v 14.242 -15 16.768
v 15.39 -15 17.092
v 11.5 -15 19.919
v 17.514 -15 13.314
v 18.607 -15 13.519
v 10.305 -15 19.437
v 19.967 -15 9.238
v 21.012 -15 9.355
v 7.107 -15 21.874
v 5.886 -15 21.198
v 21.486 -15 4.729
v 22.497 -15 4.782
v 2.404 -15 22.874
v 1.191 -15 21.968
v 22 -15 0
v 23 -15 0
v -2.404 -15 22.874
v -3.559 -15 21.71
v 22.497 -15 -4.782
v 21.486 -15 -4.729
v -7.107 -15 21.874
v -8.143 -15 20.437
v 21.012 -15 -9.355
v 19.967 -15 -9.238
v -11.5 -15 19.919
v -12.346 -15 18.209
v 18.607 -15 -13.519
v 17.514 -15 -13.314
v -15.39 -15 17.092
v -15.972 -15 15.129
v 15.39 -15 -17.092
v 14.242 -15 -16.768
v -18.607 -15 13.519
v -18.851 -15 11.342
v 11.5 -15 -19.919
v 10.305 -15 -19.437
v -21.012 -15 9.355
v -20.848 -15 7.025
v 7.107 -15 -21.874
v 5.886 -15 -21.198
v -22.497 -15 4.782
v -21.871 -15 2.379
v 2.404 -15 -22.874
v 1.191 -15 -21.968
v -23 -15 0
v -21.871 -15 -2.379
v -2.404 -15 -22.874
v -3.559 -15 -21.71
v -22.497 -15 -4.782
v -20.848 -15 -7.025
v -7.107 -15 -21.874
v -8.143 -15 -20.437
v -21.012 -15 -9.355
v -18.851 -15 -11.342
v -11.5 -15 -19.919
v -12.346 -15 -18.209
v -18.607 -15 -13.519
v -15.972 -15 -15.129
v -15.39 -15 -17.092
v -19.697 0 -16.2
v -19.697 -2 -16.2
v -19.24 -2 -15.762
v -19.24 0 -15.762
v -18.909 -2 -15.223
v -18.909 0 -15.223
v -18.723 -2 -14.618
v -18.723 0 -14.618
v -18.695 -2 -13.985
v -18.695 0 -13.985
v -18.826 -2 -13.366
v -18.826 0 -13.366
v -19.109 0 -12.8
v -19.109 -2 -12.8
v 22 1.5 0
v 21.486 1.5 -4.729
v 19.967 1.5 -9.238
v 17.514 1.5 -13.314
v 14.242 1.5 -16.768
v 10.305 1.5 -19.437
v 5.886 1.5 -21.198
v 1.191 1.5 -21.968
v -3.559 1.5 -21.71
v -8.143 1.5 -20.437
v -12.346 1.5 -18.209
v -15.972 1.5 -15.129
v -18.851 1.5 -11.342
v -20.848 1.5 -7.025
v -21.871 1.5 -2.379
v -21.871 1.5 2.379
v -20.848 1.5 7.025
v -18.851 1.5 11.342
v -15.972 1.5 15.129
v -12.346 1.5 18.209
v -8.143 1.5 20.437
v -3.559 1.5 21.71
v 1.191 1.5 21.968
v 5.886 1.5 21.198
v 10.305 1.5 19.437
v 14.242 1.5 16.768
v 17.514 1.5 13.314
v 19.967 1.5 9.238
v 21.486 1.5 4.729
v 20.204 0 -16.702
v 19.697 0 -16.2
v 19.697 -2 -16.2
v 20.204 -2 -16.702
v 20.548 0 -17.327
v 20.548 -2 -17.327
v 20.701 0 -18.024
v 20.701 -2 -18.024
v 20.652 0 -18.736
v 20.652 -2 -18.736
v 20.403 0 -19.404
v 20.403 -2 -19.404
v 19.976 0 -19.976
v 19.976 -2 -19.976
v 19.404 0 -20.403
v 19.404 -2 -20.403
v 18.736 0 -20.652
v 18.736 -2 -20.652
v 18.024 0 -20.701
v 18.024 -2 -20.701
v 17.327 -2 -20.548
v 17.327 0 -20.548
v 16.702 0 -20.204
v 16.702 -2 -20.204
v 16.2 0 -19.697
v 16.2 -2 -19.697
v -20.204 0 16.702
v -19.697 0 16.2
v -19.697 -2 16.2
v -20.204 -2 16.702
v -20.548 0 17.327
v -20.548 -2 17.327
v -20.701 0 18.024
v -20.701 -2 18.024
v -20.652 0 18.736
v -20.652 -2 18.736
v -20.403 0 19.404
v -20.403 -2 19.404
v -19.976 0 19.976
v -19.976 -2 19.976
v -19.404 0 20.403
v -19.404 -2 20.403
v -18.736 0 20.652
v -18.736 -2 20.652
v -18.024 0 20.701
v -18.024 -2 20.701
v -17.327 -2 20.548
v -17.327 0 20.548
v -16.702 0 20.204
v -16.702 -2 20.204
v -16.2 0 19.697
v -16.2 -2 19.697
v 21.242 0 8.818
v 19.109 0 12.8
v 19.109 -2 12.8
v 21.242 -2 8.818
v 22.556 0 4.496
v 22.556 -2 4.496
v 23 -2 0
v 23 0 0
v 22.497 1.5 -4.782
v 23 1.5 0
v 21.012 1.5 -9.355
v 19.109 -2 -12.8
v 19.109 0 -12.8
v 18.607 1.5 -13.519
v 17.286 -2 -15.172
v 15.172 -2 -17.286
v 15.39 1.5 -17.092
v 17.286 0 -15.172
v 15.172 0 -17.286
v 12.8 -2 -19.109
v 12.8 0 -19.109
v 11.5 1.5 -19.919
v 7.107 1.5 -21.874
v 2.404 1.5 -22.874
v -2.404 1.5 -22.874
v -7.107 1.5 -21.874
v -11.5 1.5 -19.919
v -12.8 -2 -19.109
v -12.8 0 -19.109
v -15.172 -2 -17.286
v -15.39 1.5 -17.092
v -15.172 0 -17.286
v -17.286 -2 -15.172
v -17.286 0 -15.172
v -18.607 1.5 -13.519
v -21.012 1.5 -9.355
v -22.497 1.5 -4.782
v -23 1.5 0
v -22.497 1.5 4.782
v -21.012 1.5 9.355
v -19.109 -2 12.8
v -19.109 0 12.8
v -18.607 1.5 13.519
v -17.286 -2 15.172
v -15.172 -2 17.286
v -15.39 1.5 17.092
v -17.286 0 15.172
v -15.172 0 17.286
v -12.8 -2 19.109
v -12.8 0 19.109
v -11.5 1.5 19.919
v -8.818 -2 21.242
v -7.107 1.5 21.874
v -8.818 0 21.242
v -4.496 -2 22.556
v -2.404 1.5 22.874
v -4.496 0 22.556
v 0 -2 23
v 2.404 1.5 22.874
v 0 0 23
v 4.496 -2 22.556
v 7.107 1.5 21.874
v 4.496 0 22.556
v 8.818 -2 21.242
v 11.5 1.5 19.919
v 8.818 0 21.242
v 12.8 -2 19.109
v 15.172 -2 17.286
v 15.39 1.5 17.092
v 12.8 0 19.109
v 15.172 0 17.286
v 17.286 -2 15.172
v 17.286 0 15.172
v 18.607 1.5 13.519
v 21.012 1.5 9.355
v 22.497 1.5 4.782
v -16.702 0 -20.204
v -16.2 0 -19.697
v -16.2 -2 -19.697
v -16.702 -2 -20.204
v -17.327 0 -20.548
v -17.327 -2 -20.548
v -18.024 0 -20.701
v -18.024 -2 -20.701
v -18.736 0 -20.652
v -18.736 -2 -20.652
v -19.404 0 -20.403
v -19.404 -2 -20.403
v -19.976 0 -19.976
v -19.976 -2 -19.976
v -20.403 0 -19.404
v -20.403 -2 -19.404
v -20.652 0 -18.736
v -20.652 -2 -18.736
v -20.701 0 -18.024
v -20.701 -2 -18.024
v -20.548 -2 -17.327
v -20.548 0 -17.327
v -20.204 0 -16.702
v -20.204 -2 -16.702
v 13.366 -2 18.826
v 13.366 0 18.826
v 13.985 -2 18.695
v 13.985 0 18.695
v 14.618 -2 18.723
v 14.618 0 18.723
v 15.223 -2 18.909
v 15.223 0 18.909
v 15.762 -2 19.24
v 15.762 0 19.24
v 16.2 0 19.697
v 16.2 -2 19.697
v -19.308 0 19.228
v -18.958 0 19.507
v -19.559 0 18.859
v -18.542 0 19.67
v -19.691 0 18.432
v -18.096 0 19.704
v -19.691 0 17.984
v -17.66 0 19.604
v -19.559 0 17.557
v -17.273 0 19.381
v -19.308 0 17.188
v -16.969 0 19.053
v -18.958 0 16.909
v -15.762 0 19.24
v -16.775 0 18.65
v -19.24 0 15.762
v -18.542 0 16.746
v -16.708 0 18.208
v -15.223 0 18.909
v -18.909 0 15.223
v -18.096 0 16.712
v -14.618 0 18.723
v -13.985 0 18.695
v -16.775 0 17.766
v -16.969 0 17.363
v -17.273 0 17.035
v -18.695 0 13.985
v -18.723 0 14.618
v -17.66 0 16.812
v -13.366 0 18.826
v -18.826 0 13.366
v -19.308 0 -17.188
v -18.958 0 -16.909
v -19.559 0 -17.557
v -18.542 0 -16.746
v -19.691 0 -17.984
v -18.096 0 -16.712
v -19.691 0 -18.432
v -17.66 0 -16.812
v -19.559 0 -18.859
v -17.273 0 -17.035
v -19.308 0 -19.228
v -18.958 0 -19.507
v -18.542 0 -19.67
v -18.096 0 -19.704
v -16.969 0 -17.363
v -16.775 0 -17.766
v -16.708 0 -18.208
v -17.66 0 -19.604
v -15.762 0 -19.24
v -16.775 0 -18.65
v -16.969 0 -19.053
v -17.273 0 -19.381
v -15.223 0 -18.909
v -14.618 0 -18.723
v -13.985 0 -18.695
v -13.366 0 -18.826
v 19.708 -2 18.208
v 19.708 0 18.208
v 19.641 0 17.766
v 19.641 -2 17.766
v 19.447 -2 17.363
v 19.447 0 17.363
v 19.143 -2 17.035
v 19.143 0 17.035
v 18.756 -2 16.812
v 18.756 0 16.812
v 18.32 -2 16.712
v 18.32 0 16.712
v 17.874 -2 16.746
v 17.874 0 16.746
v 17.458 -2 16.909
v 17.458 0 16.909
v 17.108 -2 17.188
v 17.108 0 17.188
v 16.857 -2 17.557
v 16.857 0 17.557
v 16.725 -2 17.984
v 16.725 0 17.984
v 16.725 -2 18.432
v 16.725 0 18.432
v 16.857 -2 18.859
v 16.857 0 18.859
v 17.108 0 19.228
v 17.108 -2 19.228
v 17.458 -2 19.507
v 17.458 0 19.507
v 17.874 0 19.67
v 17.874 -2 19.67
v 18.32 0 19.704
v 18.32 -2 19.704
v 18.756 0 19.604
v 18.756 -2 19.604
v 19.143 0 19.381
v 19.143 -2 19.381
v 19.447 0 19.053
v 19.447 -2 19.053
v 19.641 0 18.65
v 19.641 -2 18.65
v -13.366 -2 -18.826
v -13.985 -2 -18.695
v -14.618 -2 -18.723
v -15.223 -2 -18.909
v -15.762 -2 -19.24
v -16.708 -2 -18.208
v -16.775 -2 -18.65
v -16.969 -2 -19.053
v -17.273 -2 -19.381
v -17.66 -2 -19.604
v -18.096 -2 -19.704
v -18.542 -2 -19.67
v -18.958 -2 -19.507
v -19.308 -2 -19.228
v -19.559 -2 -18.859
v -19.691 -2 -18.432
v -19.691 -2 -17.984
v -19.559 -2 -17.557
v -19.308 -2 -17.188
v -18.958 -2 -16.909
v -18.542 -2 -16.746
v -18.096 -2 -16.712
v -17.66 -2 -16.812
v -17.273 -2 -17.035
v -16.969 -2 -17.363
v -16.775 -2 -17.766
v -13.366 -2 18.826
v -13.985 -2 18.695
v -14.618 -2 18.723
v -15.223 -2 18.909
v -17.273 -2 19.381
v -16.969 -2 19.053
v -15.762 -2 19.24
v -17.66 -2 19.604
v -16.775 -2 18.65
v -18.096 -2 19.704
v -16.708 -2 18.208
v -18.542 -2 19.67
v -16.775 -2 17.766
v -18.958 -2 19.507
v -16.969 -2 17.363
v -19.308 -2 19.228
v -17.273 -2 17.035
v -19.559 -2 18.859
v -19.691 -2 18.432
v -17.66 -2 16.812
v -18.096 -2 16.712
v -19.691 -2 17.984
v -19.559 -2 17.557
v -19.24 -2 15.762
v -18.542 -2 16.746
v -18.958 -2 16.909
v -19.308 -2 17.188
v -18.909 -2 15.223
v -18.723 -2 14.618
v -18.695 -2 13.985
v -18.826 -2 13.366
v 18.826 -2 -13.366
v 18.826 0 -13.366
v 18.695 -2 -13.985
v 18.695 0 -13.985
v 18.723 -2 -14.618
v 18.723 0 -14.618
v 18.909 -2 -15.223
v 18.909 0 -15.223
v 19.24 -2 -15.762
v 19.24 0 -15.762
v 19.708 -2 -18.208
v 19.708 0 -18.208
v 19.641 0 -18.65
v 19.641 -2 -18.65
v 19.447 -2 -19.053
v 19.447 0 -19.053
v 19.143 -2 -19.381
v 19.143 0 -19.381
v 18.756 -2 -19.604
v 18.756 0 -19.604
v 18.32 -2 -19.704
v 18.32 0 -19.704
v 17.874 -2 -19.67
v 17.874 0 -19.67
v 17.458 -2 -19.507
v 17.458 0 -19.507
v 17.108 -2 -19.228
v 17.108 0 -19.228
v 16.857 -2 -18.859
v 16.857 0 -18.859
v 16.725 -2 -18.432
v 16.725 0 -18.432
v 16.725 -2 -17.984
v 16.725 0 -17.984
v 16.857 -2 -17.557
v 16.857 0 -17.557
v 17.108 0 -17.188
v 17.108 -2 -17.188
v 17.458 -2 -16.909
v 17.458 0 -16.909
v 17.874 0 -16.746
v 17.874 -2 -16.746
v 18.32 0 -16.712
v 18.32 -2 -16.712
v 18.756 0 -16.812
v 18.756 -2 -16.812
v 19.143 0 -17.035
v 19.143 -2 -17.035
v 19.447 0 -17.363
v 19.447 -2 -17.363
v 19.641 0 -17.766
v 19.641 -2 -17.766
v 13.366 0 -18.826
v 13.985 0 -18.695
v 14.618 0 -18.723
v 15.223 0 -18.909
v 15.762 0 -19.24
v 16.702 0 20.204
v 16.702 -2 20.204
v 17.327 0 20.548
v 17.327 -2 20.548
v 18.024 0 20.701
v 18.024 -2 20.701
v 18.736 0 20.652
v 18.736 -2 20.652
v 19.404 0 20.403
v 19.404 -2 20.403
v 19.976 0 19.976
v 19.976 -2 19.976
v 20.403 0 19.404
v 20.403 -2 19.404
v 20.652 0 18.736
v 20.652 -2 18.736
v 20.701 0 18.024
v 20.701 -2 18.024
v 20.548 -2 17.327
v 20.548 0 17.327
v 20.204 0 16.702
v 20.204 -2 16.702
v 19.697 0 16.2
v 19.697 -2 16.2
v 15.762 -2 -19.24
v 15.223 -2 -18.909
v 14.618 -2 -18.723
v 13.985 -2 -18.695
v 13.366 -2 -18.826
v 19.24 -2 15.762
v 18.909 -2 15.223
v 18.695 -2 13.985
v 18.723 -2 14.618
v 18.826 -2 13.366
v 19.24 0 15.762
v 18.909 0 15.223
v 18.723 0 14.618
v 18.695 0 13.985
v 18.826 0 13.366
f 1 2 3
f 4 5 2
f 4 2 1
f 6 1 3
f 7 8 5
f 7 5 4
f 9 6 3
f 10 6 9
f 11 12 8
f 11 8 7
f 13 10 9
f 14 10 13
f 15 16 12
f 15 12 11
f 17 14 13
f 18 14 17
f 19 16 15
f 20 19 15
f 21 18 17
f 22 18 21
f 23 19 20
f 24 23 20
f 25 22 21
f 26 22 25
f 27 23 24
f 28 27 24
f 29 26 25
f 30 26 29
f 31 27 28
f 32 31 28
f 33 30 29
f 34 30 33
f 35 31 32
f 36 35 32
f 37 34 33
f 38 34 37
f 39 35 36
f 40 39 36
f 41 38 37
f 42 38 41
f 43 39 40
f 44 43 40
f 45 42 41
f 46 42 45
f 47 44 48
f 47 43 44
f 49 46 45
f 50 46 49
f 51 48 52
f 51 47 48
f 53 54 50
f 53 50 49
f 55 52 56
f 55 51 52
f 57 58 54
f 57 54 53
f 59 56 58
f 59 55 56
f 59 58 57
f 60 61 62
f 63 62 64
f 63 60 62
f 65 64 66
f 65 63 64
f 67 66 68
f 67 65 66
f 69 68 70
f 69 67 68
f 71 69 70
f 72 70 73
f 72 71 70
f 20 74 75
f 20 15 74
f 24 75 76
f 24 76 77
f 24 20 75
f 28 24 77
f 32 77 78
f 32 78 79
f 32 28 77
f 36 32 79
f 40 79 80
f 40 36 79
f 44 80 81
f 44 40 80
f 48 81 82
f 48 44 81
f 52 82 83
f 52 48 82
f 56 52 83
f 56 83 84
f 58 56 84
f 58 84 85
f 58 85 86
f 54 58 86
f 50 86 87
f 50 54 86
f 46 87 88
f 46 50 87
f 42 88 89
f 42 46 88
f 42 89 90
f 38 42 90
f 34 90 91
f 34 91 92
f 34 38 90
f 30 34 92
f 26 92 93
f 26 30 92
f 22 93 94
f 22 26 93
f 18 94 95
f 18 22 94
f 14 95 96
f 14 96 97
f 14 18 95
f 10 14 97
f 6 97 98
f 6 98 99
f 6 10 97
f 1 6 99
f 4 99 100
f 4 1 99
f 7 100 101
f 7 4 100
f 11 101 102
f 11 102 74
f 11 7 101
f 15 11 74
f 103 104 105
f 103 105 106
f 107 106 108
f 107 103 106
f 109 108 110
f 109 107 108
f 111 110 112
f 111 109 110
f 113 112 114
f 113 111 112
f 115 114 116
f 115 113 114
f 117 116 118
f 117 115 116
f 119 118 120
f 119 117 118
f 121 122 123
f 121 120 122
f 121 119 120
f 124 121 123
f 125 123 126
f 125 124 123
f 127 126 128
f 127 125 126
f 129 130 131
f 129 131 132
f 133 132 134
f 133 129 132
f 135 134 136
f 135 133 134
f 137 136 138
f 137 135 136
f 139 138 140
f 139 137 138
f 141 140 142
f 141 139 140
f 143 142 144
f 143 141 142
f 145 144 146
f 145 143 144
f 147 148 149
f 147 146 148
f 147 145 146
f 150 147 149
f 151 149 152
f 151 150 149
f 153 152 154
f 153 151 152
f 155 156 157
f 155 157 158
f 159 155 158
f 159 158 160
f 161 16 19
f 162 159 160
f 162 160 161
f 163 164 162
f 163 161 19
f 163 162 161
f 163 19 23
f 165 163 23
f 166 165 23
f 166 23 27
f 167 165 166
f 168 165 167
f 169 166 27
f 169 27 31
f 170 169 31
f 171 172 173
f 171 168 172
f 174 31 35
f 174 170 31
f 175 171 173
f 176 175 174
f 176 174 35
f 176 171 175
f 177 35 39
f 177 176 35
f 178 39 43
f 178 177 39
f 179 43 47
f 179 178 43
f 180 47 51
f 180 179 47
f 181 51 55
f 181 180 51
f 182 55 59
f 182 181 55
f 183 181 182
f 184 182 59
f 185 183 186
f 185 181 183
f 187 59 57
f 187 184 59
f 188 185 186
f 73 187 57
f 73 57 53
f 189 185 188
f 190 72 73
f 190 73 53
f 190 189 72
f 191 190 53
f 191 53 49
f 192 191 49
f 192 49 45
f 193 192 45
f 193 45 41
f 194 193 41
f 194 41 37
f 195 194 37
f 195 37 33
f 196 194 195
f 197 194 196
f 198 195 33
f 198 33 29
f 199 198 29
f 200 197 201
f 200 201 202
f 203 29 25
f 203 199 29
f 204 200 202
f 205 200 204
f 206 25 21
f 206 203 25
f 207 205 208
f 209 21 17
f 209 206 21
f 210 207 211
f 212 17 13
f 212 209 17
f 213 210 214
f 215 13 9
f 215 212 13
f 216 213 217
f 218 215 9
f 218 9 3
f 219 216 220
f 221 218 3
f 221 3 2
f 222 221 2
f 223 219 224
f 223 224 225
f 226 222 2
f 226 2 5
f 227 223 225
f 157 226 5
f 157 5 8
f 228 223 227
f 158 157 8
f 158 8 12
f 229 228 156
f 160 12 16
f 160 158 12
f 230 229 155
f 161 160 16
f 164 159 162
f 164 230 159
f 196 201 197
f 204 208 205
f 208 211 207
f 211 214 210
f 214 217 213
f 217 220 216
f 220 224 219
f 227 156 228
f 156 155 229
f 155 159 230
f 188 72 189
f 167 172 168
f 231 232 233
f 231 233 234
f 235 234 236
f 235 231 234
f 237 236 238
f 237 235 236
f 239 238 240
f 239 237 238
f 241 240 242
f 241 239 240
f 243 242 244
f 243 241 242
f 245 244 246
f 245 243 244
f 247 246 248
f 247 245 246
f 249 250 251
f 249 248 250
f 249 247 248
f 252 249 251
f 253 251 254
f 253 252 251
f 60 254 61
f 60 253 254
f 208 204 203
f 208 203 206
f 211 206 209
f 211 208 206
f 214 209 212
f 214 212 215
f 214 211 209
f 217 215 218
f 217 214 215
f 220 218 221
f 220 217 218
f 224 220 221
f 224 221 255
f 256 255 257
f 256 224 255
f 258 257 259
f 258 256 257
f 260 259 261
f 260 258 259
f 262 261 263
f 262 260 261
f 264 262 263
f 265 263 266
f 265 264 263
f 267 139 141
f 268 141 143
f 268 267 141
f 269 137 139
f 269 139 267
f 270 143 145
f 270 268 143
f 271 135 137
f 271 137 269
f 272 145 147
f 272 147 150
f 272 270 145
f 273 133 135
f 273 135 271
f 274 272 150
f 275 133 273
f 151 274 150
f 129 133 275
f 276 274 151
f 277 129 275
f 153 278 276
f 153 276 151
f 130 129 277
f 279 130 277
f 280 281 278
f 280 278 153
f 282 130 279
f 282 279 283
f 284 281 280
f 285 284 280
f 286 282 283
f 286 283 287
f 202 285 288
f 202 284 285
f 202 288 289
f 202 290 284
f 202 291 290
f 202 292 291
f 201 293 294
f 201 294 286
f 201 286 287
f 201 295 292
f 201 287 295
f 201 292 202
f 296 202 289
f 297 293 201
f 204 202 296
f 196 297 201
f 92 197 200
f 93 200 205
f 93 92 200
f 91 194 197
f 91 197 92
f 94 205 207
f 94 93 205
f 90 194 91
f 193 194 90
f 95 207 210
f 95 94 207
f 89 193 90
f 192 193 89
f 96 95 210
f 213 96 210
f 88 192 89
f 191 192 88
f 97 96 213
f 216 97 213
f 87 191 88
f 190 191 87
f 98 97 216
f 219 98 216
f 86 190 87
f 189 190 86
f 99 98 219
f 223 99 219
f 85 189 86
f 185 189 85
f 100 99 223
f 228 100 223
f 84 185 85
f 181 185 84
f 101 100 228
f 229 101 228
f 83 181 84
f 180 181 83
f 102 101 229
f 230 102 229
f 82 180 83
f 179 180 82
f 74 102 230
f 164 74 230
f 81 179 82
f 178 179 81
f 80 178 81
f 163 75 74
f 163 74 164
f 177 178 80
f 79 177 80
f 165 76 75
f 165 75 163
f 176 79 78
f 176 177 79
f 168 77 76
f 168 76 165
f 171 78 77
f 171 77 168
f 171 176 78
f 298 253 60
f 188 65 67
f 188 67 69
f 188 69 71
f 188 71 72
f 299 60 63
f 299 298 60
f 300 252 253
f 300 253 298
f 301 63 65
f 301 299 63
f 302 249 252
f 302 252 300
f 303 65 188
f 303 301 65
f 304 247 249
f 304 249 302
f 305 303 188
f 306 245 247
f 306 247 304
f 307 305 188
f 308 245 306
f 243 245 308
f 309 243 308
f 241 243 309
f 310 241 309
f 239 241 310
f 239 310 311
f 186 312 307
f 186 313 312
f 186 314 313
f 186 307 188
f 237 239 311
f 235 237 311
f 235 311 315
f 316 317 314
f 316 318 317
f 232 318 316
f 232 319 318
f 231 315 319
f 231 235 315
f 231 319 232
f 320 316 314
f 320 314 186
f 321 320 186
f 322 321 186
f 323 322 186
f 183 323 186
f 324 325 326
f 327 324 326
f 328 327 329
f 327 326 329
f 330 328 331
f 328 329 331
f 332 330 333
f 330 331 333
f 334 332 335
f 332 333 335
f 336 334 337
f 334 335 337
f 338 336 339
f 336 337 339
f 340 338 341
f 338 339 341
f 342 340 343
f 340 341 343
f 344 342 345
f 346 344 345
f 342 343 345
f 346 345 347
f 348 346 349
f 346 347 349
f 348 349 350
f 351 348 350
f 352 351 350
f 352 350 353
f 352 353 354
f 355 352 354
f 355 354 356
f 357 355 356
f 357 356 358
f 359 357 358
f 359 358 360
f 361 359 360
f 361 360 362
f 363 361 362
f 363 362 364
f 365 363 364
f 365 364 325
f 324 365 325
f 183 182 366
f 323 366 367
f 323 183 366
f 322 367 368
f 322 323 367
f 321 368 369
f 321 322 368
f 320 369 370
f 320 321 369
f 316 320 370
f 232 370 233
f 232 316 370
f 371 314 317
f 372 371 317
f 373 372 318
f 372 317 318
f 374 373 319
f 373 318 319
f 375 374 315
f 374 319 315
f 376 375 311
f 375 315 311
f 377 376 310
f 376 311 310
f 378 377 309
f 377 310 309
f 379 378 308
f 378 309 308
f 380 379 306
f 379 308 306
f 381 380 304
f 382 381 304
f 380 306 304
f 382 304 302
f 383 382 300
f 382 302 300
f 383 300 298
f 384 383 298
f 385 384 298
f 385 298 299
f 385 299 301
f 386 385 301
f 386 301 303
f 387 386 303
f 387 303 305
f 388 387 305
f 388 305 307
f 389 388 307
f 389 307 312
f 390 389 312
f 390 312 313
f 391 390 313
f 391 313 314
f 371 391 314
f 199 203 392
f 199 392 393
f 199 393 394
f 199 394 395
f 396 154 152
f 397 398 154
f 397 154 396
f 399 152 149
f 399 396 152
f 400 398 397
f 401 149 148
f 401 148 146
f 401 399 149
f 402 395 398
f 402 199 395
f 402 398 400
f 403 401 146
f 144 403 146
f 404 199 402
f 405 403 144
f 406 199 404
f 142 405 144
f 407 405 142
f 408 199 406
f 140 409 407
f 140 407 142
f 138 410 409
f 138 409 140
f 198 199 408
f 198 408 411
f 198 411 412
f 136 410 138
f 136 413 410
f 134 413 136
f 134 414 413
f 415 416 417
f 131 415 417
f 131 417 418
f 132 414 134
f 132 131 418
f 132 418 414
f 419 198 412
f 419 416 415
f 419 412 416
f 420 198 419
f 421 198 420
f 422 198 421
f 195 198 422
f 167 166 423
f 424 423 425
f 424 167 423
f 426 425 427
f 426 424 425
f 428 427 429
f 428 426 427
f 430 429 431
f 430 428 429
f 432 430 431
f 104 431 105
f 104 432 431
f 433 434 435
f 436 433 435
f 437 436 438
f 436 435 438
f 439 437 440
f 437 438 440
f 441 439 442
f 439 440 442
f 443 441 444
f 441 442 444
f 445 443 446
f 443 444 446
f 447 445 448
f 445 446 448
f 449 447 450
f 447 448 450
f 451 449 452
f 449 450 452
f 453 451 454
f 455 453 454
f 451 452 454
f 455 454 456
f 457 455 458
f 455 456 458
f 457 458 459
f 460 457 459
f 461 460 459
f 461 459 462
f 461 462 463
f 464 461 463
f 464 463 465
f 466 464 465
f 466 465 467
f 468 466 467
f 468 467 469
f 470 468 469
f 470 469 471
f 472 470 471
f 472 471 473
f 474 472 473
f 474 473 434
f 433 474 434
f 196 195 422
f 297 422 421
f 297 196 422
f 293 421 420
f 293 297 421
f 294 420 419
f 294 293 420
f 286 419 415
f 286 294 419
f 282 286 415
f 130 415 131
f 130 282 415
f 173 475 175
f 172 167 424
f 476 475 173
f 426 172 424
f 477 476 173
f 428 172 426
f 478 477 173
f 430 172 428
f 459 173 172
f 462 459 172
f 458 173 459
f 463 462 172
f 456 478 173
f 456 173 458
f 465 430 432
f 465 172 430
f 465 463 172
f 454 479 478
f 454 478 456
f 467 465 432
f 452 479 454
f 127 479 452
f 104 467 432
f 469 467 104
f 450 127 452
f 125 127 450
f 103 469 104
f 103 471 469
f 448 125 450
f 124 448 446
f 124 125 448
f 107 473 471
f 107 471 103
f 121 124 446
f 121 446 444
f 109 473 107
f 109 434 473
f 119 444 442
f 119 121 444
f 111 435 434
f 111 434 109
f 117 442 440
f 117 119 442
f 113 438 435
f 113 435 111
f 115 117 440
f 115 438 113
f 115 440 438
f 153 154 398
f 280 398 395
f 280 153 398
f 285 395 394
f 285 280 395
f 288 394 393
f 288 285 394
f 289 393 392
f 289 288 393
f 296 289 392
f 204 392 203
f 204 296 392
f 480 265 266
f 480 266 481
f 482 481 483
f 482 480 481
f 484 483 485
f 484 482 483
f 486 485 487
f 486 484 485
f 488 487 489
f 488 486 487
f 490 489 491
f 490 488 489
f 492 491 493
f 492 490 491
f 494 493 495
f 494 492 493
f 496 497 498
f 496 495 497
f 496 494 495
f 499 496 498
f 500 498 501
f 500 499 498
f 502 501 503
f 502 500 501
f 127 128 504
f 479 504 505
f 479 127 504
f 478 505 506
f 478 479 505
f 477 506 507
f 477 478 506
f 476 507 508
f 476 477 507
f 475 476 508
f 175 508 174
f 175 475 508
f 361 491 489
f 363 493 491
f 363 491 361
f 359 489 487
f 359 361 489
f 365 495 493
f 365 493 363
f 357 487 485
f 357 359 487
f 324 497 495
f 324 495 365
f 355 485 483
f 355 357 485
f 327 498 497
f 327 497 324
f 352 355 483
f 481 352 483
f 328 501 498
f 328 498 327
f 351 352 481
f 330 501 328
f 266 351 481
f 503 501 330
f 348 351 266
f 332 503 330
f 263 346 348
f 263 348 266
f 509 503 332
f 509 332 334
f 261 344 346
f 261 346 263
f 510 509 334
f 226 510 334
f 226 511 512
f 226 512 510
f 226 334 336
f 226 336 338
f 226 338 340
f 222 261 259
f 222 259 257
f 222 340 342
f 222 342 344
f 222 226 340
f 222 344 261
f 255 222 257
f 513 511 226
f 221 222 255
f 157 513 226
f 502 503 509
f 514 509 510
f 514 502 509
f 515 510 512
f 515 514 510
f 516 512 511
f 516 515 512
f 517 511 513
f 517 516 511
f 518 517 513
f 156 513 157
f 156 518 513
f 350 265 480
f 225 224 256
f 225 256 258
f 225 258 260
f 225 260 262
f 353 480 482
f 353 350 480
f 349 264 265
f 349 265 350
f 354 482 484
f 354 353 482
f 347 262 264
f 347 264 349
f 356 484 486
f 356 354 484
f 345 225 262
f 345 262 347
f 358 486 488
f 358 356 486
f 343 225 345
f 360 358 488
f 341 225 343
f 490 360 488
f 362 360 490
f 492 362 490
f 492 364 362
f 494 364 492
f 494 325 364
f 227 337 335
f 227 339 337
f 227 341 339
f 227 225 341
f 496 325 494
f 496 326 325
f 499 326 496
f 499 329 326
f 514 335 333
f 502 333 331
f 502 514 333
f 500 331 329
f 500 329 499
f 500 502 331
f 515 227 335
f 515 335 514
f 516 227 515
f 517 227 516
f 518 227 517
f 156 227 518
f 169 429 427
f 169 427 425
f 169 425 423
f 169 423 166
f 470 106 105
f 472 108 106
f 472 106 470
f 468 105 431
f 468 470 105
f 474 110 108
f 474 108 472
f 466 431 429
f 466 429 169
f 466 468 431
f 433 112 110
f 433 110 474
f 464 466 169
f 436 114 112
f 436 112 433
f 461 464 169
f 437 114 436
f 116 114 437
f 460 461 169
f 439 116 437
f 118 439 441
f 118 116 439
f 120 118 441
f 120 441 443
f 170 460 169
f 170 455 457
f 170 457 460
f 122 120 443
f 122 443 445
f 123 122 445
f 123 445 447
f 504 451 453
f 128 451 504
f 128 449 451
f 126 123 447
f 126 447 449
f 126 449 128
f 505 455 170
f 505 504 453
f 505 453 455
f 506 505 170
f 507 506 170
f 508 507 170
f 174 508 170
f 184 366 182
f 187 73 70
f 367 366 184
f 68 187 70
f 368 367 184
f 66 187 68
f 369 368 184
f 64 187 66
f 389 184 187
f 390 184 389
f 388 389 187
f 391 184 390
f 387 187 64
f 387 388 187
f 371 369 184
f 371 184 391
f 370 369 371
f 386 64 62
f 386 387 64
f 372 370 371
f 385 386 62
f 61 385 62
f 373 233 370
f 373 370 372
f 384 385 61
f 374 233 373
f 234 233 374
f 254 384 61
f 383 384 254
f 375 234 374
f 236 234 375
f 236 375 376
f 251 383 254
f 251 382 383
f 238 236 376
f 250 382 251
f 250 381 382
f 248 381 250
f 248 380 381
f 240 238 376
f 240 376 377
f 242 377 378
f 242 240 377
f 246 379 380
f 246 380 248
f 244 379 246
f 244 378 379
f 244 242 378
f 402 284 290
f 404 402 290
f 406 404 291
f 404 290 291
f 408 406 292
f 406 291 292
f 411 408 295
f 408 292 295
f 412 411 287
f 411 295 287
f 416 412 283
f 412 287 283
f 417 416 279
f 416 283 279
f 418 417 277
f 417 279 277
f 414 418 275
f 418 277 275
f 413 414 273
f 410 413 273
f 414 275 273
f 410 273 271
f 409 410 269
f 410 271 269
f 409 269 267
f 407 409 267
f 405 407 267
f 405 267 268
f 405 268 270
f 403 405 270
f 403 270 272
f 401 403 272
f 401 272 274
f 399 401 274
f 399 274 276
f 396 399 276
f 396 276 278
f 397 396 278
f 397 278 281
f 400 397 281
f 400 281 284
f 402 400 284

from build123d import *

# Parameters (mm, degrees)
SKETCH_2_R          = 1.5
CUT_EXTRUDE_1_DEPTH = 16
SKETCH_4_OUTSIDE_W  = 74.818
SKETCH_4_OUTSIDE_H  = 74.818
CUT_EXTRUDE_3_DEPTH = 16


with BuildPart() as part:
    # 草图1 → 旋转1 (revolve)
    with BuildSketch(Plane.XY):
        Polygon((22, 1.5), (22, -15), (23, -15), (23, -2), (28.25, -2), (28.25, 0), (23, 0), (23, 1.5), align=None)
    revolve(axis=Axis((0, 0, 0), (0, 1, 0)))

    # 草图2 → 切除-拉伸1 (cut, through all)
    with BuildSketch(Plane(origin=(0, 0, 0), x_dir=(1, 0, 0), z_dir=(0, 1, 0))):
        with Locations((-18.207999616, 18.207999616)):
            Circle(SKETCH_2_R)
        with Locations((18.207999616, 18.207999616)):
            Circle(SKETCH_2_R)
        with Locations((18.207999616, -18.207999616)):
            Circle(SKETCH_2_R)
        with Locations((-18.207999616, -18.207999616)):
            Circle(SKETCH_2_R)
    extrude(amount=-CUT_EXTRUDE_1_DEPTH, mode=Mode.SUBTRACT)

    # 草图4 outside → 切除-拉伸3 (cut, through all)
    with BuildSketch(Plane(origin=(0, 0, 0), x_dir=(1, 0, 0), z_dir=(0, 1, 0))):
        Rectangle(SKETCH_4_OUTSIDE_W, SKETCH_4_OUTSIDE_H)
        with BuildLine():
            ThreePointArc((-16.199808887, 19.697016069), (-19.975766569, 19.975766569), (-19.697016069, 16.199808887))
            ThreePointArc((-19.697016069, 16.199808887), (-18.722615608, 14.617736813), (-19.10897051, 12.800283045))
            ThreePointArc((-19.10897051, 12.800283045), (-23, 0), (-19.10897051, -12.800283045))
            ThreePointArc((-19.10897051, -12.800283045), (-18.722615608, -14.617736813), (-19.697016069, -16.199808887))
            ThreePointArc((-19.697016069, -16.199808887), (-19.975766569, -19.975766569), (-16.199808887, -19.697016069))
            ThreePointArc((-16.199808887, -19.697016069), (-14.617736813, -18.722615608), (-12.800283045, -19.10897051))
            ThreePointArc((-12.800283045, -19.10897051), (0, -23), (12.800283045, -19.10897051))
            ThreePointArc((12.800283045, -19.10897051), (14.617736813, -18.722615608), (16.199808887, -19.697016069))
            ThreePointArc((16.199808887, -19.697016069), (19.975766569, -19.975766569), (19.697016069, -16.199808887))
            ThreePointArc((19.697016069, -16.199808887), (18.722615608, -14.617736813), (19.10897051, -12.800283045))
            ThreePointArc((19.10897051, -12.800283045), (23, 0), (19.10897051, 12.800283045))
            ThreePointArc((19.10897051, 12.800283045), (18.722615608, 14.617736813), (19.697016069, 16.199808887))
            ThreePointArc((19.697016069, 16.199808887), (19.975766569, 19.975766569), (16.199808887, 19.697016069))
            ThreePointArc((16.199808887, 19.697016069), (14.617736813, 18.722615608), (12.800283045, 19.10897051))
            ThreePointArc((12.800283045, 19.10897051), (0, 23), (-12.800283045, 19.10897051))
            ThreePointArc((-12.800283045, 19.10897051), (-14.617736813, 18.722615608), (-16.199808887, 19.697016069))
        make_face(mode=Mode.SUBTRACT)
    extrude(amount=-CUT_EXTRUDE_3_DEPTH, mode=Mode.SUBTRACT)


solid = part.part
